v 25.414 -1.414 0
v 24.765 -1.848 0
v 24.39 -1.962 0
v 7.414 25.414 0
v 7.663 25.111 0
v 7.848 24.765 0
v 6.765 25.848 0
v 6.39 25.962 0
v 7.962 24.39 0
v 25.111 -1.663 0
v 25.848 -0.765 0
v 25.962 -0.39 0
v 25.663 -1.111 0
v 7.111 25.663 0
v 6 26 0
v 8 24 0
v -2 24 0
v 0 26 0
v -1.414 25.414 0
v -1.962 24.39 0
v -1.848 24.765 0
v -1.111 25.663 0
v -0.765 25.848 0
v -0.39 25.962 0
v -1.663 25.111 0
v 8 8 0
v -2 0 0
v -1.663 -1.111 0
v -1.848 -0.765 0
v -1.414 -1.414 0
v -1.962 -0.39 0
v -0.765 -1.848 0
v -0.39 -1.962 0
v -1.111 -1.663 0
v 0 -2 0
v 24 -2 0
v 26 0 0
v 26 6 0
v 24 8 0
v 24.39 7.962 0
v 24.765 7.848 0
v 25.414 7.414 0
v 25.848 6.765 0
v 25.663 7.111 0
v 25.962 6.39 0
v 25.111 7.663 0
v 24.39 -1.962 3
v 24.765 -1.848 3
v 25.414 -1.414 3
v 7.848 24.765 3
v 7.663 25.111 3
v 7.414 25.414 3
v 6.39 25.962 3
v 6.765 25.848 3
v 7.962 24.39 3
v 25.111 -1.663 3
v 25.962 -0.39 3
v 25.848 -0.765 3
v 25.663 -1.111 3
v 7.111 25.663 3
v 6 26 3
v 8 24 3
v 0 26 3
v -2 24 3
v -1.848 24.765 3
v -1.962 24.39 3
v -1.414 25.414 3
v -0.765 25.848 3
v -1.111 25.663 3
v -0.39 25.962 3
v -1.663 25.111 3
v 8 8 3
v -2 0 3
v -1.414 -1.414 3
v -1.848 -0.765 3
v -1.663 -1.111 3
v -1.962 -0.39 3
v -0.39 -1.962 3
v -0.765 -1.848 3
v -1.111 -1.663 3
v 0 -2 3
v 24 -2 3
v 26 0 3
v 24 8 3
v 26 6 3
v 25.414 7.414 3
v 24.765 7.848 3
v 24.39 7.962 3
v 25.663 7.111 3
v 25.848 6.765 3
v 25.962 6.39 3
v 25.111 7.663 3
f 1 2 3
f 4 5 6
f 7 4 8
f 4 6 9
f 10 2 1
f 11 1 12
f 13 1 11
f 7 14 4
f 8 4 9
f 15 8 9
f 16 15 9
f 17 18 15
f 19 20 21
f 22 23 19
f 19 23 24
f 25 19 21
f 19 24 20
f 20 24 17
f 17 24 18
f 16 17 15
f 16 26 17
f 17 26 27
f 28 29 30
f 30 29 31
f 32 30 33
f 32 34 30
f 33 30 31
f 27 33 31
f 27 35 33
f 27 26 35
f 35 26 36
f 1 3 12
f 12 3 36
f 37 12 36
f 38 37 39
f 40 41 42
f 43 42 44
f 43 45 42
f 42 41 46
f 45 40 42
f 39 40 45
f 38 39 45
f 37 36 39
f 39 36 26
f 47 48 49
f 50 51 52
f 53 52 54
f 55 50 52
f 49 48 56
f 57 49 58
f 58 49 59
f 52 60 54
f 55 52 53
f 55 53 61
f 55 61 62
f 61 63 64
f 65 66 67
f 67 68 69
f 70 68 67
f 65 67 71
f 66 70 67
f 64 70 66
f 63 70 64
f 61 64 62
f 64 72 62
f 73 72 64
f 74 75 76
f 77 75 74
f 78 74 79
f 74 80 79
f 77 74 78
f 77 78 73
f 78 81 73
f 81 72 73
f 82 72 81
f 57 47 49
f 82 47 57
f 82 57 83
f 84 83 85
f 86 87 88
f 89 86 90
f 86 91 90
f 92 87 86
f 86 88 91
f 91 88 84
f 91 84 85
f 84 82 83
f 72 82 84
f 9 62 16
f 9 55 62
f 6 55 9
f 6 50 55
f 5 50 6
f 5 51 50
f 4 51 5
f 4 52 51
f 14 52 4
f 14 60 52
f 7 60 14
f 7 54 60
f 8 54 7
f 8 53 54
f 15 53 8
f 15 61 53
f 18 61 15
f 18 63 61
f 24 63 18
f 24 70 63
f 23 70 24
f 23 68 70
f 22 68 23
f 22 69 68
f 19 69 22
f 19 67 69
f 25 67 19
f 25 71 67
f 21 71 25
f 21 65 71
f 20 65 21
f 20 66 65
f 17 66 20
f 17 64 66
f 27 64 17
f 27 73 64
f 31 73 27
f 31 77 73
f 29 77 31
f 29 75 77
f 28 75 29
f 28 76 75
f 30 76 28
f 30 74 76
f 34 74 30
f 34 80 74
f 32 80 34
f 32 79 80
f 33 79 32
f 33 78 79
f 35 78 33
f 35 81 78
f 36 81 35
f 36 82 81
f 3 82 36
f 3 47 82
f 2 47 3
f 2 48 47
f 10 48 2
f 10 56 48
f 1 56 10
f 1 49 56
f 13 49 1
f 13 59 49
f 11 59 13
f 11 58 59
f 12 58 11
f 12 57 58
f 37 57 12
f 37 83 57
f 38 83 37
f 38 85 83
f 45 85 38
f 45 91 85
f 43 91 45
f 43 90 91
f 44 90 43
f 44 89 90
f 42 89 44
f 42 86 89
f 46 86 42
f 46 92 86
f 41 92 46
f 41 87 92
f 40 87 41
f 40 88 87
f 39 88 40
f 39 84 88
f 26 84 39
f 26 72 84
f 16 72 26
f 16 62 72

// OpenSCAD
linear_extrude(3) minkowski(){ polygon([[0,0],[24,0],[24,6],[6,6],[6,24],[0,24]]); circle(2,$fn=32); }
